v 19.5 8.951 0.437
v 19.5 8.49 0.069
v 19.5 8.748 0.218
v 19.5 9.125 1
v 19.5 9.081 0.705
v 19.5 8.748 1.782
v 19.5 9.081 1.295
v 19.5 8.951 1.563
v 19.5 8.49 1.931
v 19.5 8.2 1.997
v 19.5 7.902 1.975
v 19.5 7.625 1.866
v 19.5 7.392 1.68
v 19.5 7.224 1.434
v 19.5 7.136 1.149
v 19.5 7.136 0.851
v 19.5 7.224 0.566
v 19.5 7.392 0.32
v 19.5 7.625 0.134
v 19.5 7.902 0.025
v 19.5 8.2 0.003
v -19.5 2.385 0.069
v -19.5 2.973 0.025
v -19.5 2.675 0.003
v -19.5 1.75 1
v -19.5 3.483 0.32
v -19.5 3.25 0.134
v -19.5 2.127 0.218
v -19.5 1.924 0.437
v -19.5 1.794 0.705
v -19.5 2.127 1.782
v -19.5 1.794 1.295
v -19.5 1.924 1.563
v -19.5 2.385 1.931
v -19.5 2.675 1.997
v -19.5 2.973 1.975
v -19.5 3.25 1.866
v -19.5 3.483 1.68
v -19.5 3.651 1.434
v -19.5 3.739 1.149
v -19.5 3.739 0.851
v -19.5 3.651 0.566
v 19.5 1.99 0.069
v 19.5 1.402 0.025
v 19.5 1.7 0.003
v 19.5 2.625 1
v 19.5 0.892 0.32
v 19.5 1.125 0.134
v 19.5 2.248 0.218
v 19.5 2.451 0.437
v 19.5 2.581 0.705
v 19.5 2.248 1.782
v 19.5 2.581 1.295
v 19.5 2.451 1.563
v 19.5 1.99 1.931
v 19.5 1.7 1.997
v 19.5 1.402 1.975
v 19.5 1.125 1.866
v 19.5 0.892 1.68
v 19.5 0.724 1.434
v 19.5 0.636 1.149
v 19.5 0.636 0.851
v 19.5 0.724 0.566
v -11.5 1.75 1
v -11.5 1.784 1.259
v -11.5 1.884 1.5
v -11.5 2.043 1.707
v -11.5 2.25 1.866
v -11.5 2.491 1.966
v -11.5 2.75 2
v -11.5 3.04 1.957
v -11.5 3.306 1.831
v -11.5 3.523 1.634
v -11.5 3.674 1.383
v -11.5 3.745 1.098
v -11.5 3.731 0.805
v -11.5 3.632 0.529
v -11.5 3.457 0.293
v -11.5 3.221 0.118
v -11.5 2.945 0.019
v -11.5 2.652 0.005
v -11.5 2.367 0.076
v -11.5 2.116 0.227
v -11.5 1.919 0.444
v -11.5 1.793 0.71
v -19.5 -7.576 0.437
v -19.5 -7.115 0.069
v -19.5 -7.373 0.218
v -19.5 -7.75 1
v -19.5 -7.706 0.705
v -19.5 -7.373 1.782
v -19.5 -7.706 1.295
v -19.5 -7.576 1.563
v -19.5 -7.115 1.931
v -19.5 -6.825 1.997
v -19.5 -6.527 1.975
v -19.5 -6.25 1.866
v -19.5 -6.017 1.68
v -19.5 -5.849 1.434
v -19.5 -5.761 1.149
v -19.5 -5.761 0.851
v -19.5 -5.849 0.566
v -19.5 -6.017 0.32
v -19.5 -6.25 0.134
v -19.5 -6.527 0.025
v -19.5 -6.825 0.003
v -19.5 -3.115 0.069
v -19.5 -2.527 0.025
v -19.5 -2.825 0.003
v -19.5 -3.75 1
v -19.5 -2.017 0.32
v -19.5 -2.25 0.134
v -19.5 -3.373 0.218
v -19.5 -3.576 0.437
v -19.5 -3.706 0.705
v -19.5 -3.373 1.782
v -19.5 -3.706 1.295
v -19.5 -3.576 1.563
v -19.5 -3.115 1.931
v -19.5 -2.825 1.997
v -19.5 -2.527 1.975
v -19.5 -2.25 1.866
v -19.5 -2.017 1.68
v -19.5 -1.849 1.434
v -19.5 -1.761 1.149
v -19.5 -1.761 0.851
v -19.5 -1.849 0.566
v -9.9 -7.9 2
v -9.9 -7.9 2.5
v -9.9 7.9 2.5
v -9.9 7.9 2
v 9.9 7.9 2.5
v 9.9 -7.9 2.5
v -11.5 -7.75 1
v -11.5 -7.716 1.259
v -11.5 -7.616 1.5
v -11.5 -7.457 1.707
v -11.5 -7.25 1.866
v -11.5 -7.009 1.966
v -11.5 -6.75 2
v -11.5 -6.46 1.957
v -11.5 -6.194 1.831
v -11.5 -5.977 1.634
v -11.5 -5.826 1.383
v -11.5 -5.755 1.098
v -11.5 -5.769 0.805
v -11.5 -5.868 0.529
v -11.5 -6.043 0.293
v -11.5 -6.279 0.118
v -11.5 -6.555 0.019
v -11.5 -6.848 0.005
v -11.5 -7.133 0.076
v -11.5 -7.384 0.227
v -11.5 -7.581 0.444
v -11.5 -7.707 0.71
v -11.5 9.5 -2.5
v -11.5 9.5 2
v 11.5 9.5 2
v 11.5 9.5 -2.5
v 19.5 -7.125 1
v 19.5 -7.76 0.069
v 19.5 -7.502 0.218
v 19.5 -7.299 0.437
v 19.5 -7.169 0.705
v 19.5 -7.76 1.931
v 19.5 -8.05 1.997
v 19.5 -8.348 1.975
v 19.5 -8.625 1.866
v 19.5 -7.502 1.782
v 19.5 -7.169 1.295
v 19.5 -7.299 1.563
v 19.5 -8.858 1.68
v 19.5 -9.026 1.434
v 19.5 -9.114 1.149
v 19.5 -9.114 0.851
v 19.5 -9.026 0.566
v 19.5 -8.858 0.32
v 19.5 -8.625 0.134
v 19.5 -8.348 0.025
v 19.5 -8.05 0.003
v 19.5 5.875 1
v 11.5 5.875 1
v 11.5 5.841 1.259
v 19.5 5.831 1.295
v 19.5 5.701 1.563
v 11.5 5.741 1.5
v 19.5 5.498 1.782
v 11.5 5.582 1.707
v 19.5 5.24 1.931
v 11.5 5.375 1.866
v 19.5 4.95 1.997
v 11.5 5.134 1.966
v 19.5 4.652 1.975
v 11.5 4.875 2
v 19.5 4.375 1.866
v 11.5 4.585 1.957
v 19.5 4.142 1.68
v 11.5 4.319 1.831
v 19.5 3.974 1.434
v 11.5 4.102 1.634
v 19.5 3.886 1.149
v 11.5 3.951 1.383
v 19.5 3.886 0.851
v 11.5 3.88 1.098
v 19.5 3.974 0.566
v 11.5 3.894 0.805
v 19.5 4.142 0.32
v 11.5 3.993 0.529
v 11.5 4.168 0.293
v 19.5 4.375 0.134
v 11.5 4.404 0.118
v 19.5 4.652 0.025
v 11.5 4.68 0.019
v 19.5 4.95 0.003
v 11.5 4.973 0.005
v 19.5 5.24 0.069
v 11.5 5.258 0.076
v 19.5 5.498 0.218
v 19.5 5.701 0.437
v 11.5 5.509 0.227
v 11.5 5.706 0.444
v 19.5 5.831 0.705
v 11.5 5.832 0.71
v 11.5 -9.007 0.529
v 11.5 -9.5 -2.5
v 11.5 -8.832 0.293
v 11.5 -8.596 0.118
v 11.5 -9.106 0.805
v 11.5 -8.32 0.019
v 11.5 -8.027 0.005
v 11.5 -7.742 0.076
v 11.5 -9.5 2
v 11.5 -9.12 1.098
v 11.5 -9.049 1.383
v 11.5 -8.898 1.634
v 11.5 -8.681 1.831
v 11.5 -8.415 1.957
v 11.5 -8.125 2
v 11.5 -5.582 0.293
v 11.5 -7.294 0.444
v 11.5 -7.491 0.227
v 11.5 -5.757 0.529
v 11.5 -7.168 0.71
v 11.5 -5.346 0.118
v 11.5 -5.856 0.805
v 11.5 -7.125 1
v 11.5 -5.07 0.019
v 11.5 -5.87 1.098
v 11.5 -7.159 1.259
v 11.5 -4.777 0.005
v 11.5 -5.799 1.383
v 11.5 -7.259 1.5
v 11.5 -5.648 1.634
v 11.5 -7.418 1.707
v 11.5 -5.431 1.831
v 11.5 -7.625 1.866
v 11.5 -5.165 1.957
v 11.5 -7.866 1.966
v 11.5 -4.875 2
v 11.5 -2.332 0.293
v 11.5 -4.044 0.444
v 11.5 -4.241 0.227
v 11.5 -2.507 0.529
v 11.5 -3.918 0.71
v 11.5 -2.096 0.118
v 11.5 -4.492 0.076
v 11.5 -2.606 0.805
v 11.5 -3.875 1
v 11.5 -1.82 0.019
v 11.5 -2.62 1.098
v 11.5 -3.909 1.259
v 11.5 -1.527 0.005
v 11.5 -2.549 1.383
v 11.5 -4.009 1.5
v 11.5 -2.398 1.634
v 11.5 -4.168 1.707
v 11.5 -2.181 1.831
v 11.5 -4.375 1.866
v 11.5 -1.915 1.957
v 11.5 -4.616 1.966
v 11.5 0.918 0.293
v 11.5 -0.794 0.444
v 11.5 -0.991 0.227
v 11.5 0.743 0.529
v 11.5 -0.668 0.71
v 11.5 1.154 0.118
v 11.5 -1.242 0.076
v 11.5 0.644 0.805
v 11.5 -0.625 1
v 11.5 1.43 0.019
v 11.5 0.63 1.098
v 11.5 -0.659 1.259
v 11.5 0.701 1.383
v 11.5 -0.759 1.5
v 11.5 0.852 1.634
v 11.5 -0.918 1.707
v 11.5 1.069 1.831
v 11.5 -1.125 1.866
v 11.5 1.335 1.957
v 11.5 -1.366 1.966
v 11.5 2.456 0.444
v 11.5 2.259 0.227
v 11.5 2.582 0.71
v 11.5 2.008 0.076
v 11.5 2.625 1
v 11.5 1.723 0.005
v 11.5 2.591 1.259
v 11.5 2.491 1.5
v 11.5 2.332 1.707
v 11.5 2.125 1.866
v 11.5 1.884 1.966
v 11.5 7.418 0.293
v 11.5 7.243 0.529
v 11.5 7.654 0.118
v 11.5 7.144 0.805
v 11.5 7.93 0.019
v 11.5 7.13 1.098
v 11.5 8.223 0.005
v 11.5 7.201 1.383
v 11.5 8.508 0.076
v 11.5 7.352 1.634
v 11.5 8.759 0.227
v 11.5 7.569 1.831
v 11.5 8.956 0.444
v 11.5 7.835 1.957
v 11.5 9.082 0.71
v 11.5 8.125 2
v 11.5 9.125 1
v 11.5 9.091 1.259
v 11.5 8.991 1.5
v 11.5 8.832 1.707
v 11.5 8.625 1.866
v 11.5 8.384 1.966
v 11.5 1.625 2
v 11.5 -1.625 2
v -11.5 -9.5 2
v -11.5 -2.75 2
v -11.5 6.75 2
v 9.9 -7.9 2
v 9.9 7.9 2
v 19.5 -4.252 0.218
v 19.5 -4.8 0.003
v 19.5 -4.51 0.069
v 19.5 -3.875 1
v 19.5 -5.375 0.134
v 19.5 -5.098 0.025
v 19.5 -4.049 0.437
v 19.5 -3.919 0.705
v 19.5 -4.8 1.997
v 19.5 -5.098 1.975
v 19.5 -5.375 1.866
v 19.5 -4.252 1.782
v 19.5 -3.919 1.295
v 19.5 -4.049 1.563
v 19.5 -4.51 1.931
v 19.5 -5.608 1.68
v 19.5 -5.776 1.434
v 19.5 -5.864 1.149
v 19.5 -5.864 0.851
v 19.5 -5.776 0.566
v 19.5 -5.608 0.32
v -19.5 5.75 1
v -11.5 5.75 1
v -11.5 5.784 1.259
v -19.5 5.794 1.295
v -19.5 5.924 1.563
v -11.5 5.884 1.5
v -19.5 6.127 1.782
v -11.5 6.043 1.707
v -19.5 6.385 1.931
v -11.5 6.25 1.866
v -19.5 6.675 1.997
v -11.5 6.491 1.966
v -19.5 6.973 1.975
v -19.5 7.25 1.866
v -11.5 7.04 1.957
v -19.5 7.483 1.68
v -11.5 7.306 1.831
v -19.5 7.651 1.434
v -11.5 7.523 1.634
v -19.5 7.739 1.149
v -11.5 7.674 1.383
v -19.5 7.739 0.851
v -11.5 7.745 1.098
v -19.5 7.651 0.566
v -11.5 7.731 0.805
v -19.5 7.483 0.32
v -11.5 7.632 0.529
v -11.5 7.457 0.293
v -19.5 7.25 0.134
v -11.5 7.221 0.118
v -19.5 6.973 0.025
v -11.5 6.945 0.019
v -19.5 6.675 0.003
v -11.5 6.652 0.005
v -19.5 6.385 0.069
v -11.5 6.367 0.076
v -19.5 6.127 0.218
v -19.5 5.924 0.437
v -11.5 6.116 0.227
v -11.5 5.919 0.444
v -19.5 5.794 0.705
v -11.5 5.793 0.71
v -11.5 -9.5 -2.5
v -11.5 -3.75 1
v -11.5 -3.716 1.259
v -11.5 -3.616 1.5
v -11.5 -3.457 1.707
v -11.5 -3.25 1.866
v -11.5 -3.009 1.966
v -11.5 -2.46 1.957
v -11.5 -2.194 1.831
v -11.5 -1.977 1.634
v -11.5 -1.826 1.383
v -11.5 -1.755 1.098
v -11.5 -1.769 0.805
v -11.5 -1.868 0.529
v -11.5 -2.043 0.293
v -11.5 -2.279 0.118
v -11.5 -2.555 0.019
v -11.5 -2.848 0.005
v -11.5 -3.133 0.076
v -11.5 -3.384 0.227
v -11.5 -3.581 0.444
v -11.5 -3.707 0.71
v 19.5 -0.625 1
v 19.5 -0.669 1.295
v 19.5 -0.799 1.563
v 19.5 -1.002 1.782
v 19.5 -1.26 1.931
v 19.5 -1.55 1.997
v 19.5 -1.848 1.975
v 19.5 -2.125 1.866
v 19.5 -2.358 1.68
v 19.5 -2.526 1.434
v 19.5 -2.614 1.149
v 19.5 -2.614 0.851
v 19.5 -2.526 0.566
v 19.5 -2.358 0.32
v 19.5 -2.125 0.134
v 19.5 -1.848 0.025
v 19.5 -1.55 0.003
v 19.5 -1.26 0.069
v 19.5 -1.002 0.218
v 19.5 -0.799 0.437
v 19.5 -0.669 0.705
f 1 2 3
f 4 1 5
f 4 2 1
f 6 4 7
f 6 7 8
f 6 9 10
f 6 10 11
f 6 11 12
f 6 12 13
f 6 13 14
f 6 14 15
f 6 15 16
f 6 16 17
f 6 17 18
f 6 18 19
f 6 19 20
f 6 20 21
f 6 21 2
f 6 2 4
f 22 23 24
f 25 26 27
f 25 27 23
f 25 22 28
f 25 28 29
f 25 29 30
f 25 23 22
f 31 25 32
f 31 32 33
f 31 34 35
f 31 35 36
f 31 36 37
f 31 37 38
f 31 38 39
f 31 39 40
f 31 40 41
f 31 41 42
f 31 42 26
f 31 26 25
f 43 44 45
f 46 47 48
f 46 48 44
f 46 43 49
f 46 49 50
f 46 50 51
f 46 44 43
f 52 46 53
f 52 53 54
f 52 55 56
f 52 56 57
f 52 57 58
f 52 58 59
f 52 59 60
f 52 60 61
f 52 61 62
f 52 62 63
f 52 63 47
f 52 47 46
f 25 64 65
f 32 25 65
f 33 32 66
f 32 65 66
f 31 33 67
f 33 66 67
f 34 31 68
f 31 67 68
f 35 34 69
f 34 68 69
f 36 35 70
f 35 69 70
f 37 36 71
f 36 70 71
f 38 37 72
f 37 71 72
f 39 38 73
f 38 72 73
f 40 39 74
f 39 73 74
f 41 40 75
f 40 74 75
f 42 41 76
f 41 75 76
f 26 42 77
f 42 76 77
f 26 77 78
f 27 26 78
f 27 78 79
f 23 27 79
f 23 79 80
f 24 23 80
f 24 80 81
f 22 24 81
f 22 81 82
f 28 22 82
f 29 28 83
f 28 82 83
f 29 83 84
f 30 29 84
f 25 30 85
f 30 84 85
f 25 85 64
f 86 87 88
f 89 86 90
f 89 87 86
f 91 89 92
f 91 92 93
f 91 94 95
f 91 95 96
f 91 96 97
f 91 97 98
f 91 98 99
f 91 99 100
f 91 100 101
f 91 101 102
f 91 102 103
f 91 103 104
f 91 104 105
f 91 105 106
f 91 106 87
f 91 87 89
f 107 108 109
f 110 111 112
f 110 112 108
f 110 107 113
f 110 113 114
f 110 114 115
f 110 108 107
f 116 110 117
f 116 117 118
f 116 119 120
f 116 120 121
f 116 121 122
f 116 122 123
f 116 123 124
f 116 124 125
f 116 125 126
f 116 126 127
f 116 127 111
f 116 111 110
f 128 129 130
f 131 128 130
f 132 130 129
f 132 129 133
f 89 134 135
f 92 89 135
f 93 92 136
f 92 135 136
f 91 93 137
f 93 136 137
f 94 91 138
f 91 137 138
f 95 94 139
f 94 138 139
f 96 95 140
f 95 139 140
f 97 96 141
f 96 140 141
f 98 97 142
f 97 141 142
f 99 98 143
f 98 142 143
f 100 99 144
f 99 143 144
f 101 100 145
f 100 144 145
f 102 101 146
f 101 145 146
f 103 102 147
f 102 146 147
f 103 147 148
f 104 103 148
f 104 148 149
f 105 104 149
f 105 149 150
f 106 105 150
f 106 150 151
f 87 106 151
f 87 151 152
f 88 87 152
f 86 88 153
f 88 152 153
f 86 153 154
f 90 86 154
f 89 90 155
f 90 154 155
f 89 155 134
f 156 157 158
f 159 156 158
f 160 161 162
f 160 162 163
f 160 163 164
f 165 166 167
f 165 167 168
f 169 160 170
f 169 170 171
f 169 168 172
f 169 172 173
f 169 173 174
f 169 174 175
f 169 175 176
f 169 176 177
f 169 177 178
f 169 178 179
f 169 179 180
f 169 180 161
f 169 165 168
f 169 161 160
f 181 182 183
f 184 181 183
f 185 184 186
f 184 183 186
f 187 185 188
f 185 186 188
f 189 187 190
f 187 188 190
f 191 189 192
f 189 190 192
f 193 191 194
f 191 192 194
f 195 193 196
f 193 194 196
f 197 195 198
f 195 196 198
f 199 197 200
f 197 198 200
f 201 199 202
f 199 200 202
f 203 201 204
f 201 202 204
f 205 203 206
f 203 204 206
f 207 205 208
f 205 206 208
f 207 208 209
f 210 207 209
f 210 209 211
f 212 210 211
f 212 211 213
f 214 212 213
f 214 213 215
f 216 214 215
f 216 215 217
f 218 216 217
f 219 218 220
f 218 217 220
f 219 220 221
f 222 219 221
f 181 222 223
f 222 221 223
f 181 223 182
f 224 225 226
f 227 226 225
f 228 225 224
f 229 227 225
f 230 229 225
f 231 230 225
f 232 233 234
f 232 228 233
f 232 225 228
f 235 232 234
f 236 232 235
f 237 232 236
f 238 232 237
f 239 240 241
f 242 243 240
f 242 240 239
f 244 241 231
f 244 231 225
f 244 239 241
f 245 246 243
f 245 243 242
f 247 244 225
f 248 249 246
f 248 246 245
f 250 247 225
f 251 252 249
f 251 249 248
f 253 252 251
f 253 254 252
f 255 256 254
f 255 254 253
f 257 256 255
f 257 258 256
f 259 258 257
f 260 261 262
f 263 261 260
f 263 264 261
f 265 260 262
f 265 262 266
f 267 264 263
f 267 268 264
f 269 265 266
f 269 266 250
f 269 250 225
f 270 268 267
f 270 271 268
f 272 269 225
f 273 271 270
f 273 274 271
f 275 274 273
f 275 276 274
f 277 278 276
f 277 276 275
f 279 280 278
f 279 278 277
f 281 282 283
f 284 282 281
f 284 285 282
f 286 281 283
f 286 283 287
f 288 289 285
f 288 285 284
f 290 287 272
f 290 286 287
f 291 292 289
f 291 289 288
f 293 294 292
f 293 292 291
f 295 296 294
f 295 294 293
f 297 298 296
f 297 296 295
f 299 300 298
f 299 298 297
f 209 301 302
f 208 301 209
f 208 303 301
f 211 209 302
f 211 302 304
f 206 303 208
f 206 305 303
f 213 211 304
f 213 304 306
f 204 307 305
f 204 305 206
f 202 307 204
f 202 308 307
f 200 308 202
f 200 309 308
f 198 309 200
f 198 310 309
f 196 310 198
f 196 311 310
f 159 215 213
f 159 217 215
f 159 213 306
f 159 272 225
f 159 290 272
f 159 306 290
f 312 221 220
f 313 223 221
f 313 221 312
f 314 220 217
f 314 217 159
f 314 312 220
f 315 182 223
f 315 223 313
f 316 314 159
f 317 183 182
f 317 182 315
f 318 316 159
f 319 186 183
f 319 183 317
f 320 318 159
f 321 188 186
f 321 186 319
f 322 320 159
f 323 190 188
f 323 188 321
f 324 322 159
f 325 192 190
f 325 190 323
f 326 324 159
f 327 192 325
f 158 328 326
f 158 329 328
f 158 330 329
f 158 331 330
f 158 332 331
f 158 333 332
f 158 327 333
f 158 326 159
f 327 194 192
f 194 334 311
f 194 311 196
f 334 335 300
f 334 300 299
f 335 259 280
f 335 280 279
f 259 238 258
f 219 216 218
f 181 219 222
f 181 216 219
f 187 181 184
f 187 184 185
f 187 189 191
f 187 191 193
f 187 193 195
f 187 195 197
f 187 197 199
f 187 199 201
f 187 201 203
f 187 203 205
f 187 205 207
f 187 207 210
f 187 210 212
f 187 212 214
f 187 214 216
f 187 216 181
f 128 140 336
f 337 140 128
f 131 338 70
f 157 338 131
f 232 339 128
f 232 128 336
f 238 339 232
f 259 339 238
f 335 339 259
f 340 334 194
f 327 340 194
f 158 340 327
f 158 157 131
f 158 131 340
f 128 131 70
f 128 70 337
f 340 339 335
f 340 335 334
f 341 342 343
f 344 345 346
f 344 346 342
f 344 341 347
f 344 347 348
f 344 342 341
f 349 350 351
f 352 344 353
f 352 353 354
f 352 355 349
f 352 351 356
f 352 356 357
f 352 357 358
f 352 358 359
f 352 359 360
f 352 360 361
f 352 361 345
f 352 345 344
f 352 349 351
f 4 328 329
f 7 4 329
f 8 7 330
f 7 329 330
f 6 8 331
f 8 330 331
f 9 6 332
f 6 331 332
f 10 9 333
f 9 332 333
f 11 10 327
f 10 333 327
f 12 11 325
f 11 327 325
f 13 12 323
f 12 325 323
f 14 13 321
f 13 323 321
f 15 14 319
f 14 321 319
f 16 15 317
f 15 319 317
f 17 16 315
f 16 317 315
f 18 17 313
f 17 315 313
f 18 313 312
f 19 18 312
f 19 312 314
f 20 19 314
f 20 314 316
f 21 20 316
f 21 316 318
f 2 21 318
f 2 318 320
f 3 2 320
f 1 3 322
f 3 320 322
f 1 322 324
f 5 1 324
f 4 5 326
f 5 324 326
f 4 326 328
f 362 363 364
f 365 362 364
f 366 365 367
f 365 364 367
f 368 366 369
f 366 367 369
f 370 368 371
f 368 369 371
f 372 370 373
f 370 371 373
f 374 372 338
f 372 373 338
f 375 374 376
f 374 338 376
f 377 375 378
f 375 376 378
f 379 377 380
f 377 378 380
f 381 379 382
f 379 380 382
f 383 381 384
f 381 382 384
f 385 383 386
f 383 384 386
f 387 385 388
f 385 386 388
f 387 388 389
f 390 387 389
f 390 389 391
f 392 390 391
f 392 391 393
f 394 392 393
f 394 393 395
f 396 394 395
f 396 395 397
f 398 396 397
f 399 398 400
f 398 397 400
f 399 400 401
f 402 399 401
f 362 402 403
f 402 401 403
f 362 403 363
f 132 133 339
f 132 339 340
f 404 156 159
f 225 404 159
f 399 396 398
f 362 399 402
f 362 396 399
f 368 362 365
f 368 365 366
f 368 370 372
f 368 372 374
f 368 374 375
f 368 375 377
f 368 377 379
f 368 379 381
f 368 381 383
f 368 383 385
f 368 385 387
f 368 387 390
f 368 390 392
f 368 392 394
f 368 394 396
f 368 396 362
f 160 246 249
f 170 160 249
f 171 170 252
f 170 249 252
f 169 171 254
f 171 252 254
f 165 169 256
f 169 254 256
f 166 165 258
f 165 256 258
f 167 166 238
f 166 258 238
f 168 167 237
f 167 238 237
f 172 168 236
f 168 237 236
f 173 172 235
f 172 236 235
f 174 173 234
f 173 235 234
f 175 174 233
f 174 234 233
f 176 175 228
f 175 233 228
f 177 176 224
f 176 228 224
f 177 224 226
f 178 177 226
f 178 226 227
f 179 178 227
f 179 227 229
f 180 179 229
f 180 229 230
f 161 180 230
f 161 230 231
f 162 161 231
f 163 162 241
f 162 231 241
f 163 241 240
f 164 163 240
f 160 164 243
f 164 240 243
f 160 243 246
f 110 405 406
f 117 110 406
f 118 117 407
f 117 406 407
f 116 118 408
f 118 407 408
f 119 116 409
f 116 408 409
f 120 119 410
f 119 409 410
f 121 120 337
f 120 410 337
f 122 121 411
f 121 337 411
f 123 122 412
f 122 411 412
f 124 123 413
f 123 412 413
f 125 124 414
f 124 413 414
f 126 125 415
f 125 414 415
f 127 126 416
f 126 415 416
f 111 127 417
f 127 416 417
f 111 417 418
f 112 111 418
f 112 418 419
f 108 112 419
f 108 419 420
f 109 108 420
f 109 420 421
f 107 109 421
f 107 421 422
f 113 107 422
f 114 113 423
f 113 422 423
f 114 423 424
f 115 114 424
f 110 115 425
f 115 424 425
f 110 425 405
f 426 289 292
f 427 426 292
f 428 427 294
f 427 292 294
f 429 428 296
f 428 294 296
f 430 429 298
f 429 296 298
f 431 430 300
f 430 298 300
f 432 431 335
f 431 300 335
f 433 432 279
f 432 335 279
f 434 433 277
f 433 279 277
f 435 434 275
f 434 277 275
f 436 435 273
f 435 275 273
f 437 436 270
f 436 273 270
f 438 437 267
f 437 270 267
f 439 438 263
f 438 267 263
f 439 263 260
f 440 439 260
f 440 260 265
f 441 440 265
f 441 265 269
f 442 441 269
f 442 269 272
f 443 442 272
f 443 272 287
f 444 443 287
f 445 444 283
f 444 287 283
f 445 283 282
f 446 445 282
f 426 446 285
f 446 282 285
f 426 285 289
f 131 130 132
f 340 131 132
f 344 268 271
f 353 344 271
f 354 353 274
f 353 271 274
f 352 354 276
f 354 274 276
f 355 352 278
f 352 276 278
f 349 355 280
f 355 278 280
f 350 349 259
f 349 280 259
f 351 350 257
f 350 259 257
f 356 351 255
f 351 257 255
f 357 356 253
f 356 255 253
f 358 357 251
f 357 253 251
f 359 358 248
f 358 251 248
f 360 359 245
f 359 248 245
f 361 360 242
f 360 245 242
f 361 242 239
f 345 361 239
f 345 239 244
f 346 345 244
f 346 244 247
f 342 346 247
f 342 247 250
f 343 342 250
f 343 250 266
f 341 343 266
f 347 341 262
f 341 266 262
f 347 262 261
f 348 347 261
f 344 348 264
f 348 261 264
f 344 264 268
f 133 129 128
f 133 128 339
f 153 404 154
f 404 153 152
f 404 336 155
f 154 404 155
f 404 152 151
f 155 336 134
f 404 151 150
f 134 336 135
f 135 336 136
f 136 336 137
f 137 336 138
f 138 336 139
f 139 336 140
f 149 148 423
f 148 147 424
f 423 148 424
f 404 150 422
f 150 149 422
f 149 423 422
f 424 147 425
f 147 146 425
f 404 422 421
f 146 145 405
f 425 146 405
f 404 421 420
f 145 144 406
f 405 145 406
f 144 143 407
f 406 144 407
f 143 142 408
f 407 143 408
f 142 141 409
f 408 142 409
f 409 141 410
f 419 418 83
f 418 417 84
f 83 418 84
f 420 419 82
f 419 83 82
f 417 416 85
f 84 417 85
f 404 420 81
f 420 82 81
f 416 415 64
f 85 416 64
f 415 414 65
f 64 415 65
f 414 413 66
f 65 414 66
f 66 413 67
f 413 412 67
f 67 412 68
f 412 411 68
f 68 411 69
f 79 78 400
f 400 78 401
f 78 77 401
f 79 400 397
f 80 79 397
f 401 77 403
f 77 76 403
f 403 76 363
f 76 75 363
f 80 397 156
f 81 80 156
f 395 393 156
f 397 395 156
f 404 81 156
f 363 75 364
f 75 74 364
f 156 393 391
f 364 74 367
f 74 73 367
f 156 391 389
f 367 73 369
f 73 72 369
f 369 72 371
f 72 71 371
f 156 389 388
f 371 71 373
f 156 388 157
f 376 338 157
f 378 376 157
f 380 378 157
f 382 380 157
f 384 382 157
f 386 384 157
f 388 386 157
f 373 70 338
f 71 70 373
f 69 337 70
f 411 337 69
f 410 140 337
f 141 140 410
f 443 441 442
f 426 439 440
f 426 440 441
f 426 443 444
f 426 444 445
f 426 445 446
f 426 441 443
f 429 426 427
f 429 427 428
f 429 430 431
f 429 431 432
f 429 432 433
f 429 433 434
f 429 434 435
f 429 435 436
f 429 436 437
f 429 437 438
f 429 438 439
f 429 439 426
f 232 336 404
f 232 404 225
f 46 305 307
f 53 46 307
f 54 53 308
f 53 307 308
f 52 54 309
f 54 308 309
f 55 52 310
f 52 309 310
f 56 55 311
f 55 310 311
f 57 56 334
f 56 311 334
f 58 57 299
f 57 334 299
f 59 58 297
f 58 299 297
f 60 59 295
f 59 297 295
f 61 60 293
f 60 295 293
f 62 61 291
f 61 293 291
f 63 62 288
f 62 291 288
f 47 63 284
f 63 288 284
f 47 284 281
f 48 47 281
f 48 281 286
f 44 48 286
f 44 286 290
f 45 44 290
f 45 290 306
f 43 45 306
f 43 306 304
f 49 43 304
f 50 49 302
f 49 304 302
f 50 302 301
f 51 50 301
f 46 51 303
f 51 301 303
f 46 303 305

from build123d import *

# Parameters (mm, degrees)
F0_W     = 23
F0_H     = 19
F1_DEPTH = 2.5
F2_R     = 1
F3_DEPTH = 8
F4_R     = 1
F5_DEPTH = 8
F6_W     = 23
F6_H     = 19
F6_W_2   = 19.8
F6_H_2   = 15.8
F7_DEPTH = 0.5


with BuildPart() as f1:
    # F0 (on Top) → F1 (new body, symmetric)
    with BuildSketch(Plane.XY):
        Rectangle(F0_W, F0_H)
    extrude(amount=F1_DEPTH, both=True)

    # F2 (on face) → F3 (join)
    with BuildSketch(Plane.YZ.offset(11.5)):
        with Locations((-8.125, 1)):
            Circle(F2_R)
        with Locations((-4.875, 1)):
            Circle(F2_R)
        with Locations((-1.625, 1)):
            Circle(F2_R)
        with Locations((1.625, 1)):
            Circle(F2_R)
        with Locations((4.875, 1)):
            Circle(F2_R)
        with Locations((8.125, 1)):
            Circle(F2_R)
    extrude(amount=F3_DEPTH)

    # F4 (on face) → F5 (join)
    with BuildSketch(Plane(origin=(-11.5, 0, 0), x_dir=(0, -1, 0), z_dir=(-1, 0, 0))):
        with Locations((-6.75, 1)):
            Circle(F4_R)
        with Locations((-2.75, 1)):
            Circle(F4_R)
        with Locations((2.75, 1)):
            Circle(F4_R)
        with Locations((6.75, 1)):
            Circle(F4_R)
    extrude(amount=F5_DEPTH)

    # F6 (on face) → F7 (cut)
    with BuildSketch(Plane.XY.offset(2.5)):
        Rectangle(F6_W, F6_H)
        Rectangle(F6_W_2, F6_H_2, mode=Mode.SUBTRACT)
    extrude(amount=-F7_DEPTH, mode=Mode.SUBTRACT)


solid = f1.part
